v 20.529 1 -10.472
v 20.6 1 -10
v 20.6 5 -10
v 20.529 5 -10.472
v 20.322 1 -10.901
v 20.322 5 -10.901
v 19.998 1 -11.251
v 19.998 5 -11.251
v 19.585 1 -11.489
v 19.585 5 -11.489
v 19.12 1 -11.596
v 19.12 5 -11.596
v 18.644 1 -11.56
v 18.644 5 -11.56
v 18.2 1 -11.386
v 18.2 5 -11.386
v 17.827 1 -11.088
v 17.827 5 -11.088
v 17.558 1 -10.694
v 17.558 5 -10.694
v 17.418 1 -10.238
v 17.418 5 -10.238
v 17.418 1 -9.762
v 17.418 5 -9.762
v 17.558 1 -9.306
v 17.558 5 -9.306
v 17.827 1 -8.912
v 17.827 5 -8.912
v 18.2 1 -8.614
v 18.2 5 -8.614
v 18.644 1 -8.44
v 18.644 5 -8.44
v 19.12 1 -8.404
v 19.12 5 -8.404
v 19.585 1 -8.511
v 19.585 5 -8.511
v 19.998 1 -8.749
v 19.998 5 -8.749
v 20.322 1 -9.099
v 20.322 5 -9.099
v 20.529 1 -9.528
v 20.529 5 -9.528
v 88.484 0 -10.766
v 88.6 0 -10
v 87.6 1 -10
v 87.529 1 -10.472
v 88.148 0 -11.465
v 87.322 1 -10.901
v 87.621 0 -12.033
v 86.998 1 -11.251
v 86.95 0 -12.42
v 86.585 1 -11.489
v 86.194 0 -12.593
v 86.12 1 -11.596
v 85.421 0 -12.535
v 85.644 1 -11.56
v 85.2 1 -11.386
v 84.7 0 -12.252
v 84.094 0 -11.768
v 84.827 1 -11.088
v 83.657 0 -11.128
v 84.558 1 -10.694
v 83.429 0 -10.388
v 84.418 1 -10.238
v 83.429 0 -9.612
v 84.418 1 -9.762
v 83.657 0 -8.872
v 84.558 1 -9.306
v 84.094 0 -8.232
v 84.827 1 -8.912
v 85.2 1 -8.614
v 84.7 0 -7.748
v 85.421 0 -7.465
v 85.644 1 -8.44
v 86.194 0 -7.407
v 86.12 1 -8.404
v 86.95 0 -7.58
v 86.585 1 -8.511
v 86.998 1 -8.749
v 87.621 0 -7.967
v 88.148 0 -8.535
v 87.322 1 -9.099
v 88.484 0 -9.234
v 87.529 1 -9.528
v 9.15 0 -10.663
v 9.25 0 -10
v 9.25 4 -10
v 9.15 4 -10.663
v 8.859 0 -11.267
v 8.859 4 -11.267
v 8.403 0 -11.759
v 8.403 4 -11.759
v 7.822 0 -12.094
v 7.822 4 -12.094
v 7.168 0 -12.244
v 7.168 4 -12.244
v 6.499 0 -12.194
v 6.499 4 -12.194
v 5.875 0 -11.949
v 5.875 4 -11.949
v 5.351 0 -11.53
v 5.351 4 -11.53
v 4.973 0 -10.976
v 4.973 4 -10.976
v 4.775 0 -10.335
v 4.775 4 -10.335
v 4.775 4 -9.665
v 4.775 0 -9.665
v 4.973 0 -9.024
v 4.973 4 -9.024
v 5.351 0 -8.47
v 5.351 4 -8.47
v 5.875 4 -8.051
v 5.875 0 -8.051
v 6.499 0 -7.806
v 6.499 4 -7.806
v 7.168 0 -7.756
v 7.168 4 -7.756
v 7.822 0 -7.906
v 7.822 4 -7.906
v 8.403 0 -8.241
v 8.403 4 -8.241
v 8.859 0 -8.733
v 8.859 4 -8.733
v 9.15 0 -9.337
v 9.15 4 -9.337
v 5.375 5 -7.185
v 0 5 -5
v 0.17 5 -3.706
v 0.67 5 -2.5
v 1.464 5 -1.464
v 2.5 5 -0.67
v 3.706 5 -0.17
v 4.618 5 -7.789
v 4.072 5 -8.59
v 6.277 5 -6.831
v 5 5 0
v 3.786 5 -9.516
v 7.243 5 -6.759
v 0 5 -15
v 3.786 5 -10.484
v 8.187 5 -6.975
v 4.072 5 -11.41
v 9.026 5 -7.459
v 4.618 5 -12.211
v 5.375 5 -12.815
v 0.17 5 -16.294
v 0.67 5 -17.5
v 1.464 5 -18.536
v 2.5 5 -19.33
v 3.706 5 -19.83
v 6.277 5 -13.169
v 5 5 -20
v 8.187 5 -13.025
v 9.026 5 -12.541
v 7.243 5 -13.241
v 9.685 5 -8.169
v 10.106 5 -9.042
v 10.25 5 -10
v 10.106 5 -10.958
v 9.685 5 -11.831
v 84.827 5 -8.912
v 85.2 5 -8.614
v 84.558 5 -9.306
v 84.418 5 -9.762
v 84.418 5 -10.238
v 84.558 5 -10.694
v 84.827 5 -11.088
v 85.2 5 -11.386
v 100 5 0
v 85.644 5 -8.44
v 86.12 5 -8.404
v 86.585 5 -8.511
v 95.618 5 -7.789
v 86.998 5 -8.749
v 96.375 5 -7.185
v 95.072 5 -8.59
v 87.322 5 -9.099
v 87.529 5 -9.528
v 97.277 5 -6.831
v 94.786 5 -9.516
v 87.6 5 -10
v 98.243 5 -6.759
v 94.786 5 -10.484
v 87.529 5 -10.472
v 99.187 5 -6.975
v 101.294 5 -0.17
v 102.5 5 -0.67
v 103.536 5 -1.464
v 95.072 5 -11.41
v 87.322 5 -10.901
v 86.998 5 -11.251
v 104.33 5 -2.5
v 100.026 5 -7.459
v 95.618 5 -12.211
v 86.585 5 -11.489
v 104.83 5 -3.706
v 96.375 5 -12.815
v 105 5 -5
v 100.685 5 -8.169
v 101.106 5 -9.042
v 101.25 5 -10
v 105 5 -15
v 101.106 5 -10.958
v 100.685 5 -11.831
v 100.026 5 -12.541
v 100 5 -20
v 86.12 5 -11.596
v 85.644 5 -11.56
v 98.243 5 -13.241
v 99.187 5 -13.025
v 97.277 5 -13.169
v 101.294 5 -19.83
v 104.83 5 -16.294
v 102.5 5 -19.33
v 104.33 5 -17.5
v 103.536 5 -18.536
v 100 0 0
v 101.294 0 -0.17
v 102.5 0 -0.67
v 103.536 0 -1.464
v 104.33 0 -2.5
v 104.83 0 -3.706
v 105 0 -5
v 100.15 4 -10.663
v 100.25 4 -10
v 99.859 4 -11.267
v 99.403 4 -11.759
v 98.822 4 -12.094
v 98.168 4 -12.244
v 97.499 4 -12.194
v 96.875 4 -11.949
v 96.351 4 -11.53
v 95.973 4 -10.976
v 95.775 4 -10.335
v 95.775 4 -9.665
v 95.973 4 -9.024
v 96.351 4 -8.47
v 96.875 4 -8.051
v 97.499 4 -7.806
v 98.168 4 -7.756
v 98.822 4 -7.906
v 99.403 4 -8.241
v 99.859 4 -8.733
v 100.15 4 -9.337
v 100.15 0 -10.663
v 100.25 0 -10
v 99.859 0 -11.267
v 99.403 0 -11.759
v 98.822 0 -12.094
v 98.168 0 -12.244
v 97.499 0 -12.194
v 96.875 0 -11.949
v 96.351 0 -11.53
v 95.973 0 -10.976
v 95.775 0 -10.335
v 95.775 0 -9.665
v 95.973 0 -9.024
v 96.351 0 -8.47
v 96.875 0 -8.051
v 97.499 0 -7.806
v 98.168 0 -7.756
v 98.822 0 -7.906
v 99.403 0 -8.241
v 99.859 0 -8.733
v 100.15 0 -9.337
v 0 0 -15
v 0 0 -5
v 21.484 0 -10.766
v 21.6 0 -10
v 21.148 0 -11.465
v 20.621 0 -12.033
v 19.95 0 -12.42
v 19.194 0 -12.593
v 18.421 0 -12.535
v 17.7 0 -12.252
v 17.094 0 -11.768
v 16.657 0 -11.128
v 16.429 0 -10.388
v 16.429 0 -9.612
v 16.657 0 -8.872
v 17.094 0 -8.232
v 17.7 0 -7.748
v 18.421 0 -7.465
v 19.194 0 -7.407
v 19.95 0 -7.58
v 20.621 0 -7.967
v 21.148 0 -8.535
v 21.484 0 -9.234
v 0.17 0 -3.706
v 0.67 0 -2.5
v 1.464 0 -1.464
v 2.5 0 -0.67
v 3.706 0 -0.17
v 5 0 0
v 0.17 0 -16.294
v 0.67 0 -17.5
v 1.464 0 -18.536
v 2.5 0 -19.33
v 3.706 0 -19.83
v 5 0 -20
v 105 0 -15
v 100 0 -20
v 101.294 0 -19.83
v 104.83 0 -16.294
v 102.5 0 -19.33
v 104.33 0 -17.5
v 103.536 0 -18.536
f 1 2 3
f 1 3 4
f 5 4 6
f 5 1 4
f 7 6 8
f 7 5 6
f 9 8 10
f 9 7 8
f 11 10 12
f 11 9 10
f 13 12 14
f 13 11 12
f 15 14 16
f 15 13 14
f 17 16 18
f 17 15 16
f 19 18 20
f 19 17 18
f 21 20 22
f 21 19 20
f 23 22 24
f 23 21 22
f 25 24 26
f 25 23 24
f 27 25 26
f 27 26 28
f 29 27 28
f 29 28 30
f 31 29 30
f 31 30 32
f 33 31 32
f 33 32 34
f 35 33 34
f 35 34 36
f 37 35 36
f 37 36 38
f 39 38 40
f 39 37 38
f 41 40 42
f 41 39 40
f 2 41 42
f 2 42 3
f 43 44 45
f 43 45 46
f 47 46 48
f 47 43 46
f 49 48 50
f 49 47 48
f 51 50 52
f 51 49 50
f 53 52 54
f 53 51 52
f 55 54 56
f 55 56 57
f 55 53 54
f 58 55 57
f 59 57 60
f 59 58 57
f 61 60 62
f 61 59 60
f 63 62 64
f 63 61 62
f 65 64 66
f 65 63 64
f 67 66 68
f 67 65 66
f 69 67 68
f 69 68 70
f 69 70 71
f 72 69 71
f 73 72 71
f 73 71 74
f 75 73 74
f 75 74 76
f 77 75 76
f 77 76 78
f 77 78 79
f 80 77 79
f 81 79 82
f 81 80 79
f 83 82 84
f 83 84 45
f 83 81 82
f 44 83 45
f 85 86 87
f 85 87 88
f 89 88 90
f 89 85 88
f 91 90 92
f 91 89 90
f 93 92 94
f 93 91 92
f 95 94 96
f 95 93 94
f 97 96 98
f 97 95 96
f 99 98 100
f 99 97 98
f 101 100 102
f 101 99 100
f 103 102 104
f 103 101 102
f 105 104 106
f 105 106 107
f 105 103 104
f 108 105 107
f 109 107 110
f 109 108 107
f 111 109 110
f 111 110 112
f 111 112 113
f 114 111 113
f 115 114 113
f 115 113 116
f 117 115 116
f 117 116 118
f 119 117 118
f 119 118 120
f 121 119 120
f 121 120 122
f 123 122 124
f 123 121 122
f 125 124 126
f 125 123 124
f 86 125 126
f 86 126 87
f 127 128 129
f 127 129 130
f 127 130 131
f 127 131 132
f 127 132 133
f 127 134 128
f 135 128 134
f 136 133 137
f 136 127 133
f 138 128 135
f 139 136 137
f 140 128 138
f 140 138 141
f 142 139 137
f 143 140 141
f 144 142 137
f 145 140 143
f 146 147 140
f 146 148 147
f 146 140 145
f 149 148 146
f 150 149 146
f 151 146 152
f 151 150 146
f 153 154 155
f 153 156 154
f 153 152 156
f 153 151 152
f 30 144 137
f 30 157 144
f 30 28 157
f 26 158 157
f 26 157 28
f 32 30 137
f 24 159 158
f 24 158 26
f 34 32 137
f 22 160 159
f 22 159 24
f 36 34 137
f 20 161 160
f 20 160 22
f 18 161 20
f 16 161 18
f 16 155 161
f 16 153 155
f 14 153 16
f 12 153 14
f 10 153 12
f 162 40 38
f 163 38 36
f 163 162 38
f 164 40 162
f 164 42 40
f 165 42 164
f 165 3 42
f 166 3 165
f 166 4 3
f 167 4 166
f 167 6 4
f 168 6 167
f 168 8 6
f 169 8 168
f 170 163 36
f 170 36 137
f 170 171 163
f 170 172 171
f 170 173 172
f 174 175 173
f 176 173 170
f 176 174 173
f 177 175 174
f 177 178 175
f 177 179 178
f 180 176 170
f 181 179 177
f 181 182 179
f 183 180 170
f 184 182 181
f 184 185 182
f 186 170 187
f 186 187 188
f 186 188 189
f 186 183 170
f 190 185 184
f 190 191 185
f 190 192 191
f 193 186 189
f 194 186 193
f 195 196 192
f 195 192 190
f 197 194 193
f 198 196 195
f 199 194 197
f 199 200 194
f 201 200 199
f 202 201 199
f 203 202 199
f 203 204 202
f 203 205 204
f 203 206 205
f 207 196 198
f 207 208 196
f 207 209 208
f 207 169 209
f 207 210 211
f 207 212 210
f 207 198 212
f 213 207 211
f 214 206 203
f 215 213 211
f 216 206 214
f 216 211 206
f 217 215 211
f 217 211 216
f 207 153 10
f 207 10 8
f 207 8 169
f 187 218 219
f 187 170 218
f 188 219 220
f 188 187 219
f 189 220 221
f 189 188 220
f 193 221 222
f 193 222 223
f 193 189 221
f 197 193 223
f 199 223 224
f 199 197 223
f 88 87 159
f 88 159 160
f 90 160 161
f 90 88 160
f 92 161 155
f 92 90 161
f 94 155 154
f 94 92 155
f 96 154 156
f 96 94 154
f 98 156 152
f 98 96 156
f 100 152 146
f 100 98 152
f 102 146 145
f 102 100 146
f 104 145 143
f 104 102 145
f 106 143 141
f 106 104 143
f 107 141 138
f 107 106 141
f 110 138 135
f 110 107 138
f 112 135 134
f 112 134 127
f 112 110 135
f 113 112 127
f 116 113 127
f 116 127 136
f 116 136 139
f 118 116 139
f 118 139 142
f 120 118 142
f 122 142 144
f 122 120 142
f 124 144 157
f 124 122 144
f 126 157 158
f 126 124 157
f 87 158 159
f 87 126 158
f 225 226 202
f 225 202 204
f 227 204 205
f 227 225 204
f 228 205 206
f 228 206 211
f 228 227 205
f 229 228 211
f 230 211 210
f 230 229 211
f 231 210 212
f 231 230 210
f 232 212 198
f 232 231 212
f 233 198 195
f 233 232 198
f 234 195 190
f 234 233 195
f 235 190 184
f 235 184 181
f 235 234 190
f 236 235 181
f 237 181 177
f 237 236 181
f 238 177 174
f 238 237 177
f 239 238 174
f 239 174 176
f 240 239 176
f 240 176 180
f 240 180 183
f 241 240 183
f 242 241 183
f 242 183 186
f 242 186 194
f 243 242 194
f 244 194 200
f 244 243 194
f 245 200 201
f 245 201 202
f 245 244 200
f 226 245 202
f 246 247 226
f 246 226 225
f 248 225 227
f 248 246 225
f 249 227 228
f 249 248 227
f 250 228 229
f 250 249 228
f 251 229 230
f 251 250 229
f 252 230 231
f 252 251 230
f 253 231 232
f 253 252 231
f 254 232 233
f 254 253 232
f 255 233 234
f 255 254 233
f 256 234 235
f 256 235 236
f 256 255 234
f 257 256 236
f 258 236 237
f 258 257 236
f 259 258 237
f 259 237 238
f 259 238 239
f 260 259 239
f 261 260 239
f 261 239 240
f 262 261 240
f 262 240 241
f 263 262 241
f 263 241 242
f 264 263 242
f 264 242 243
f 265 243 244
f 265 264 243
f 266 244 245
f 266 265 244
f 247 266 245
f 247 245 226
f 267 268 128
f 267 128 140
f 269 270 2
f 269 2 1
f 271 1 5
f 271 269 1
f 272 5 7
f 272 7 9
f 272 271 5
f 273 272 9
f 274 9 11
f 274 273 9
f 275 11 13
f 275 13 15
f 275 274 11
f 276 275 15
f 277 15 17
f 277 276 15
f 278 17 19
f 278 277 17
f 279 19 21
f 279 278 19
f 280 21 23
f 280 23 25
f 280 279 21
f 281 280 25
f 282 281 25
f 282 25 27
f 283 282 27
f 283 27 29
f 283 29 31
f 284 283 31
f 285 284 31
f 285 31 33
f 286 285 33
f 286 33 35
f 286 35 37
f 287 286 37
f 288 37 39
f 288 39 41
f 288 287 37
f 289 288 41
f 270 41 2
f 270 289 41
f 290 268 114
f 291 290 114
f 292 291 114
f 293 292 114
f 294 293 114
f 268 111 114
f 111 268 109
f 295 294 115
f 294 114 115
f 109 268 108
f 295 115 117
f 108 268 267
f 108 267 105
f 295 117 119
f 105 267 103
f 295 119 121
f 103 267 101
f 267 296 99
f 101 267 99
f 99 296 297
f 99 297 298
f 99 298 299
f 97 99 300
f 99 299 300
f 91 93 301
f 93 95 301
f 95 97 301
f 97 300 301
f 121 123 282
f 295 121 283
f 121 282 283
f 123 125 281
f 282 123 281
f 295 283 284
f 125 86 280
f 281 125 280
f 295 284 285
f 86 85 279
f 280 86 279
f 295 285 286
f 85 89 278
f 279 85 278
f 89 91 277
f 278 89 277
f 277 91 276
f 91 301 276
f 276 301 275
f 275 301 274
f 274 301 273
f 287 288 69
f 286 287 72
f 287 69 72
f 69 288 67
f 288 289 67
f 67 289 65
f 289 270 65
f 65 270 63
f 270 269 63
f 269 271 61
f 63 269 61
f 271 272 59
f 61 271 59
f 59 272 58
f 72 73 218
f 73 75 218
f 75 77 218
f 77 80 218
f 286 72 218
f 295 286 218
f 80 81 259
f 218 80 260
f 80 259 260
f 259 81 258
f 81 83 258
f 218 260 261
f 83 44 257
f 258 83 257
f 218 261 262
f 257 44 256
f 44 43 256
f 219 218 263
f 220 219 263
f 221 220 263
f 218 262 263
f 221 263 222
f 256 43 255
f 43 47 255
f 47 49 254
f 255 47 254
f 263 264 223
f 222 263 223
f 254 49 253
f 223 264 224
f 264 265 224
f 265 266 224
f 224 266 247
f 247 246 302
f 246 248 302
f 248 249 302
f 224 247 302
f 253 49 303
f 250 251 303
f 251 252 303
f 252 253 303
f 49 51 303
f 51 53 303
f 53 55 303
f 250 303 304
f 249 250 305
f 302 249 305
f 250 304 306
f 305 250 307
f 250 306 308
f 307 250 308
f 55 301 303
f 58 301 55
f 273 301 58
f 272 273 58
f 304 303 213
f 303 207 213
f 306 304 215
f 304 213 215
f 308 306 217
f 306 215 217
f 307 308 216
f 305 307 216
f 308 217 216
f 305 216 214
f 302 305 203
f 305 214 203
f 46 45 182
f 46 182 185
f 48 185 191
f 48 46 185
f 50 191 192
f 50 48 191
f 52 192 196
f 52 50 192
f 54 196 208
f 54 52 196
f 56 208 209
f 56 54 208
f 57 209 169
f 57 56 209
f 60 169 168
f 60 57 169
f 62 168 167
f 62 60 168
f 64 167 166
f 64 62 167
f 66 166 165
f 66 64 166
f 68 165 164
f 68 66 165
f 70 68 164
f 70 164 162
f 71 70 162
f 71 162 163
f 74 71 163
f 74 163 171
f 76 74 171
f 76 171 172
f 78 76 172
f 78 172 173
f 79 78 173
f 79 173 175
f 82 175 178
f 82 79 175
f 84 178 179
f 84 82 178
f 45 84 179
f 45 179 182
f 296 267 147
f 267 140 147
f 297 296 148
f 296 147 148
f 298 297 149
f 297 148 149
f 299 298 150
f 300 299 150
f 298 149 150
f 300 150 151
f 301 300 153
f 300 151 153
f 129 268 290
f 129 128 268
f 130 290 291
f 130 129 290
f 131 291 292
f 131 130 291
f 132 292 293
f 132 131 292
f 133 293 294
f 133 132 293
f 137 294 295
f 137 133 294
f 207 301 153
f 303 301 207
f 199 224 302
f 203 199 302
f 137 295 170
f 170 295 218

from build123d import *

# Parameters (mm, degrees)
SKETCH_1_W      = 105
SKETCH_1_H      = 20
SKETCH_1_R      = 1.6
SKETCH_1_R_2    = 2.25
EXTRUDE_1_DEPTH = 5
FILLET_2_R      = 5
CHAMFER_1_SIZE  = 1
CHAMFER_2_SIZE  = 1


with BuildPart() as part:
    # Эскиз1 → Бобышка-Вытянуть1 (new body)
    with BuildSketch(Plane(origin=(0, 0, 0), x_dir=(1, 0, 0), z_dir=(0, 1, 0))):
        with Locations((52.5, 10)):
            Rectangle(SKETCH_1_W, SKETCH_1_H)
        with Locations((19, 10)):
            Circle(SKETCH_1_R, mode=Mode.SUBTRACT)
        with Locations((86, 10)):
            Circle(SKETCH_1_R, mode=Mode.SUBTRACT)
        with Locations((7, 10)):
            Circle(SKETCH_1_R_2, mode=Mode.SUBTRACT)
        with Locations((98, 10)):
            Circle(SKETCH_1_R_2, mode=Mode.SUBTRACT)
    extrude(amount=EXTRUDE_1_DEPTH)

    # Скругление2
    fillet_2_edges = [part.edges().sort_by_distance(p)[0] for p in [
        (0, 2.5, -20),
        (105, 2.5, -20),
        (105, 2.5, 0),
        (0, 2.5, 0),
    ]]
    fillet(fillet_2_edges, radius=FILLET_2_R)

    # Фаска1
    chamfer_1_edges = [part.edges().sort_by_distance(p)[0] for p in [
        (4.75, 5, -10),
        (95.75, 5, -10),
    ]]
    chamfer(chamfer_1_edges, length=CHAMFER_1_SIZE)

    # Фаска2
    chamfer_2_edges = [part.edges().sort_by_distance(p)[0] for p in [
        (17.4, 0, -10),
        (84.4, 0, -10),
    ]]
    chamfer(chamfer_2_edges, length=CHAMFER_2_SIZE)


solid = part.part
